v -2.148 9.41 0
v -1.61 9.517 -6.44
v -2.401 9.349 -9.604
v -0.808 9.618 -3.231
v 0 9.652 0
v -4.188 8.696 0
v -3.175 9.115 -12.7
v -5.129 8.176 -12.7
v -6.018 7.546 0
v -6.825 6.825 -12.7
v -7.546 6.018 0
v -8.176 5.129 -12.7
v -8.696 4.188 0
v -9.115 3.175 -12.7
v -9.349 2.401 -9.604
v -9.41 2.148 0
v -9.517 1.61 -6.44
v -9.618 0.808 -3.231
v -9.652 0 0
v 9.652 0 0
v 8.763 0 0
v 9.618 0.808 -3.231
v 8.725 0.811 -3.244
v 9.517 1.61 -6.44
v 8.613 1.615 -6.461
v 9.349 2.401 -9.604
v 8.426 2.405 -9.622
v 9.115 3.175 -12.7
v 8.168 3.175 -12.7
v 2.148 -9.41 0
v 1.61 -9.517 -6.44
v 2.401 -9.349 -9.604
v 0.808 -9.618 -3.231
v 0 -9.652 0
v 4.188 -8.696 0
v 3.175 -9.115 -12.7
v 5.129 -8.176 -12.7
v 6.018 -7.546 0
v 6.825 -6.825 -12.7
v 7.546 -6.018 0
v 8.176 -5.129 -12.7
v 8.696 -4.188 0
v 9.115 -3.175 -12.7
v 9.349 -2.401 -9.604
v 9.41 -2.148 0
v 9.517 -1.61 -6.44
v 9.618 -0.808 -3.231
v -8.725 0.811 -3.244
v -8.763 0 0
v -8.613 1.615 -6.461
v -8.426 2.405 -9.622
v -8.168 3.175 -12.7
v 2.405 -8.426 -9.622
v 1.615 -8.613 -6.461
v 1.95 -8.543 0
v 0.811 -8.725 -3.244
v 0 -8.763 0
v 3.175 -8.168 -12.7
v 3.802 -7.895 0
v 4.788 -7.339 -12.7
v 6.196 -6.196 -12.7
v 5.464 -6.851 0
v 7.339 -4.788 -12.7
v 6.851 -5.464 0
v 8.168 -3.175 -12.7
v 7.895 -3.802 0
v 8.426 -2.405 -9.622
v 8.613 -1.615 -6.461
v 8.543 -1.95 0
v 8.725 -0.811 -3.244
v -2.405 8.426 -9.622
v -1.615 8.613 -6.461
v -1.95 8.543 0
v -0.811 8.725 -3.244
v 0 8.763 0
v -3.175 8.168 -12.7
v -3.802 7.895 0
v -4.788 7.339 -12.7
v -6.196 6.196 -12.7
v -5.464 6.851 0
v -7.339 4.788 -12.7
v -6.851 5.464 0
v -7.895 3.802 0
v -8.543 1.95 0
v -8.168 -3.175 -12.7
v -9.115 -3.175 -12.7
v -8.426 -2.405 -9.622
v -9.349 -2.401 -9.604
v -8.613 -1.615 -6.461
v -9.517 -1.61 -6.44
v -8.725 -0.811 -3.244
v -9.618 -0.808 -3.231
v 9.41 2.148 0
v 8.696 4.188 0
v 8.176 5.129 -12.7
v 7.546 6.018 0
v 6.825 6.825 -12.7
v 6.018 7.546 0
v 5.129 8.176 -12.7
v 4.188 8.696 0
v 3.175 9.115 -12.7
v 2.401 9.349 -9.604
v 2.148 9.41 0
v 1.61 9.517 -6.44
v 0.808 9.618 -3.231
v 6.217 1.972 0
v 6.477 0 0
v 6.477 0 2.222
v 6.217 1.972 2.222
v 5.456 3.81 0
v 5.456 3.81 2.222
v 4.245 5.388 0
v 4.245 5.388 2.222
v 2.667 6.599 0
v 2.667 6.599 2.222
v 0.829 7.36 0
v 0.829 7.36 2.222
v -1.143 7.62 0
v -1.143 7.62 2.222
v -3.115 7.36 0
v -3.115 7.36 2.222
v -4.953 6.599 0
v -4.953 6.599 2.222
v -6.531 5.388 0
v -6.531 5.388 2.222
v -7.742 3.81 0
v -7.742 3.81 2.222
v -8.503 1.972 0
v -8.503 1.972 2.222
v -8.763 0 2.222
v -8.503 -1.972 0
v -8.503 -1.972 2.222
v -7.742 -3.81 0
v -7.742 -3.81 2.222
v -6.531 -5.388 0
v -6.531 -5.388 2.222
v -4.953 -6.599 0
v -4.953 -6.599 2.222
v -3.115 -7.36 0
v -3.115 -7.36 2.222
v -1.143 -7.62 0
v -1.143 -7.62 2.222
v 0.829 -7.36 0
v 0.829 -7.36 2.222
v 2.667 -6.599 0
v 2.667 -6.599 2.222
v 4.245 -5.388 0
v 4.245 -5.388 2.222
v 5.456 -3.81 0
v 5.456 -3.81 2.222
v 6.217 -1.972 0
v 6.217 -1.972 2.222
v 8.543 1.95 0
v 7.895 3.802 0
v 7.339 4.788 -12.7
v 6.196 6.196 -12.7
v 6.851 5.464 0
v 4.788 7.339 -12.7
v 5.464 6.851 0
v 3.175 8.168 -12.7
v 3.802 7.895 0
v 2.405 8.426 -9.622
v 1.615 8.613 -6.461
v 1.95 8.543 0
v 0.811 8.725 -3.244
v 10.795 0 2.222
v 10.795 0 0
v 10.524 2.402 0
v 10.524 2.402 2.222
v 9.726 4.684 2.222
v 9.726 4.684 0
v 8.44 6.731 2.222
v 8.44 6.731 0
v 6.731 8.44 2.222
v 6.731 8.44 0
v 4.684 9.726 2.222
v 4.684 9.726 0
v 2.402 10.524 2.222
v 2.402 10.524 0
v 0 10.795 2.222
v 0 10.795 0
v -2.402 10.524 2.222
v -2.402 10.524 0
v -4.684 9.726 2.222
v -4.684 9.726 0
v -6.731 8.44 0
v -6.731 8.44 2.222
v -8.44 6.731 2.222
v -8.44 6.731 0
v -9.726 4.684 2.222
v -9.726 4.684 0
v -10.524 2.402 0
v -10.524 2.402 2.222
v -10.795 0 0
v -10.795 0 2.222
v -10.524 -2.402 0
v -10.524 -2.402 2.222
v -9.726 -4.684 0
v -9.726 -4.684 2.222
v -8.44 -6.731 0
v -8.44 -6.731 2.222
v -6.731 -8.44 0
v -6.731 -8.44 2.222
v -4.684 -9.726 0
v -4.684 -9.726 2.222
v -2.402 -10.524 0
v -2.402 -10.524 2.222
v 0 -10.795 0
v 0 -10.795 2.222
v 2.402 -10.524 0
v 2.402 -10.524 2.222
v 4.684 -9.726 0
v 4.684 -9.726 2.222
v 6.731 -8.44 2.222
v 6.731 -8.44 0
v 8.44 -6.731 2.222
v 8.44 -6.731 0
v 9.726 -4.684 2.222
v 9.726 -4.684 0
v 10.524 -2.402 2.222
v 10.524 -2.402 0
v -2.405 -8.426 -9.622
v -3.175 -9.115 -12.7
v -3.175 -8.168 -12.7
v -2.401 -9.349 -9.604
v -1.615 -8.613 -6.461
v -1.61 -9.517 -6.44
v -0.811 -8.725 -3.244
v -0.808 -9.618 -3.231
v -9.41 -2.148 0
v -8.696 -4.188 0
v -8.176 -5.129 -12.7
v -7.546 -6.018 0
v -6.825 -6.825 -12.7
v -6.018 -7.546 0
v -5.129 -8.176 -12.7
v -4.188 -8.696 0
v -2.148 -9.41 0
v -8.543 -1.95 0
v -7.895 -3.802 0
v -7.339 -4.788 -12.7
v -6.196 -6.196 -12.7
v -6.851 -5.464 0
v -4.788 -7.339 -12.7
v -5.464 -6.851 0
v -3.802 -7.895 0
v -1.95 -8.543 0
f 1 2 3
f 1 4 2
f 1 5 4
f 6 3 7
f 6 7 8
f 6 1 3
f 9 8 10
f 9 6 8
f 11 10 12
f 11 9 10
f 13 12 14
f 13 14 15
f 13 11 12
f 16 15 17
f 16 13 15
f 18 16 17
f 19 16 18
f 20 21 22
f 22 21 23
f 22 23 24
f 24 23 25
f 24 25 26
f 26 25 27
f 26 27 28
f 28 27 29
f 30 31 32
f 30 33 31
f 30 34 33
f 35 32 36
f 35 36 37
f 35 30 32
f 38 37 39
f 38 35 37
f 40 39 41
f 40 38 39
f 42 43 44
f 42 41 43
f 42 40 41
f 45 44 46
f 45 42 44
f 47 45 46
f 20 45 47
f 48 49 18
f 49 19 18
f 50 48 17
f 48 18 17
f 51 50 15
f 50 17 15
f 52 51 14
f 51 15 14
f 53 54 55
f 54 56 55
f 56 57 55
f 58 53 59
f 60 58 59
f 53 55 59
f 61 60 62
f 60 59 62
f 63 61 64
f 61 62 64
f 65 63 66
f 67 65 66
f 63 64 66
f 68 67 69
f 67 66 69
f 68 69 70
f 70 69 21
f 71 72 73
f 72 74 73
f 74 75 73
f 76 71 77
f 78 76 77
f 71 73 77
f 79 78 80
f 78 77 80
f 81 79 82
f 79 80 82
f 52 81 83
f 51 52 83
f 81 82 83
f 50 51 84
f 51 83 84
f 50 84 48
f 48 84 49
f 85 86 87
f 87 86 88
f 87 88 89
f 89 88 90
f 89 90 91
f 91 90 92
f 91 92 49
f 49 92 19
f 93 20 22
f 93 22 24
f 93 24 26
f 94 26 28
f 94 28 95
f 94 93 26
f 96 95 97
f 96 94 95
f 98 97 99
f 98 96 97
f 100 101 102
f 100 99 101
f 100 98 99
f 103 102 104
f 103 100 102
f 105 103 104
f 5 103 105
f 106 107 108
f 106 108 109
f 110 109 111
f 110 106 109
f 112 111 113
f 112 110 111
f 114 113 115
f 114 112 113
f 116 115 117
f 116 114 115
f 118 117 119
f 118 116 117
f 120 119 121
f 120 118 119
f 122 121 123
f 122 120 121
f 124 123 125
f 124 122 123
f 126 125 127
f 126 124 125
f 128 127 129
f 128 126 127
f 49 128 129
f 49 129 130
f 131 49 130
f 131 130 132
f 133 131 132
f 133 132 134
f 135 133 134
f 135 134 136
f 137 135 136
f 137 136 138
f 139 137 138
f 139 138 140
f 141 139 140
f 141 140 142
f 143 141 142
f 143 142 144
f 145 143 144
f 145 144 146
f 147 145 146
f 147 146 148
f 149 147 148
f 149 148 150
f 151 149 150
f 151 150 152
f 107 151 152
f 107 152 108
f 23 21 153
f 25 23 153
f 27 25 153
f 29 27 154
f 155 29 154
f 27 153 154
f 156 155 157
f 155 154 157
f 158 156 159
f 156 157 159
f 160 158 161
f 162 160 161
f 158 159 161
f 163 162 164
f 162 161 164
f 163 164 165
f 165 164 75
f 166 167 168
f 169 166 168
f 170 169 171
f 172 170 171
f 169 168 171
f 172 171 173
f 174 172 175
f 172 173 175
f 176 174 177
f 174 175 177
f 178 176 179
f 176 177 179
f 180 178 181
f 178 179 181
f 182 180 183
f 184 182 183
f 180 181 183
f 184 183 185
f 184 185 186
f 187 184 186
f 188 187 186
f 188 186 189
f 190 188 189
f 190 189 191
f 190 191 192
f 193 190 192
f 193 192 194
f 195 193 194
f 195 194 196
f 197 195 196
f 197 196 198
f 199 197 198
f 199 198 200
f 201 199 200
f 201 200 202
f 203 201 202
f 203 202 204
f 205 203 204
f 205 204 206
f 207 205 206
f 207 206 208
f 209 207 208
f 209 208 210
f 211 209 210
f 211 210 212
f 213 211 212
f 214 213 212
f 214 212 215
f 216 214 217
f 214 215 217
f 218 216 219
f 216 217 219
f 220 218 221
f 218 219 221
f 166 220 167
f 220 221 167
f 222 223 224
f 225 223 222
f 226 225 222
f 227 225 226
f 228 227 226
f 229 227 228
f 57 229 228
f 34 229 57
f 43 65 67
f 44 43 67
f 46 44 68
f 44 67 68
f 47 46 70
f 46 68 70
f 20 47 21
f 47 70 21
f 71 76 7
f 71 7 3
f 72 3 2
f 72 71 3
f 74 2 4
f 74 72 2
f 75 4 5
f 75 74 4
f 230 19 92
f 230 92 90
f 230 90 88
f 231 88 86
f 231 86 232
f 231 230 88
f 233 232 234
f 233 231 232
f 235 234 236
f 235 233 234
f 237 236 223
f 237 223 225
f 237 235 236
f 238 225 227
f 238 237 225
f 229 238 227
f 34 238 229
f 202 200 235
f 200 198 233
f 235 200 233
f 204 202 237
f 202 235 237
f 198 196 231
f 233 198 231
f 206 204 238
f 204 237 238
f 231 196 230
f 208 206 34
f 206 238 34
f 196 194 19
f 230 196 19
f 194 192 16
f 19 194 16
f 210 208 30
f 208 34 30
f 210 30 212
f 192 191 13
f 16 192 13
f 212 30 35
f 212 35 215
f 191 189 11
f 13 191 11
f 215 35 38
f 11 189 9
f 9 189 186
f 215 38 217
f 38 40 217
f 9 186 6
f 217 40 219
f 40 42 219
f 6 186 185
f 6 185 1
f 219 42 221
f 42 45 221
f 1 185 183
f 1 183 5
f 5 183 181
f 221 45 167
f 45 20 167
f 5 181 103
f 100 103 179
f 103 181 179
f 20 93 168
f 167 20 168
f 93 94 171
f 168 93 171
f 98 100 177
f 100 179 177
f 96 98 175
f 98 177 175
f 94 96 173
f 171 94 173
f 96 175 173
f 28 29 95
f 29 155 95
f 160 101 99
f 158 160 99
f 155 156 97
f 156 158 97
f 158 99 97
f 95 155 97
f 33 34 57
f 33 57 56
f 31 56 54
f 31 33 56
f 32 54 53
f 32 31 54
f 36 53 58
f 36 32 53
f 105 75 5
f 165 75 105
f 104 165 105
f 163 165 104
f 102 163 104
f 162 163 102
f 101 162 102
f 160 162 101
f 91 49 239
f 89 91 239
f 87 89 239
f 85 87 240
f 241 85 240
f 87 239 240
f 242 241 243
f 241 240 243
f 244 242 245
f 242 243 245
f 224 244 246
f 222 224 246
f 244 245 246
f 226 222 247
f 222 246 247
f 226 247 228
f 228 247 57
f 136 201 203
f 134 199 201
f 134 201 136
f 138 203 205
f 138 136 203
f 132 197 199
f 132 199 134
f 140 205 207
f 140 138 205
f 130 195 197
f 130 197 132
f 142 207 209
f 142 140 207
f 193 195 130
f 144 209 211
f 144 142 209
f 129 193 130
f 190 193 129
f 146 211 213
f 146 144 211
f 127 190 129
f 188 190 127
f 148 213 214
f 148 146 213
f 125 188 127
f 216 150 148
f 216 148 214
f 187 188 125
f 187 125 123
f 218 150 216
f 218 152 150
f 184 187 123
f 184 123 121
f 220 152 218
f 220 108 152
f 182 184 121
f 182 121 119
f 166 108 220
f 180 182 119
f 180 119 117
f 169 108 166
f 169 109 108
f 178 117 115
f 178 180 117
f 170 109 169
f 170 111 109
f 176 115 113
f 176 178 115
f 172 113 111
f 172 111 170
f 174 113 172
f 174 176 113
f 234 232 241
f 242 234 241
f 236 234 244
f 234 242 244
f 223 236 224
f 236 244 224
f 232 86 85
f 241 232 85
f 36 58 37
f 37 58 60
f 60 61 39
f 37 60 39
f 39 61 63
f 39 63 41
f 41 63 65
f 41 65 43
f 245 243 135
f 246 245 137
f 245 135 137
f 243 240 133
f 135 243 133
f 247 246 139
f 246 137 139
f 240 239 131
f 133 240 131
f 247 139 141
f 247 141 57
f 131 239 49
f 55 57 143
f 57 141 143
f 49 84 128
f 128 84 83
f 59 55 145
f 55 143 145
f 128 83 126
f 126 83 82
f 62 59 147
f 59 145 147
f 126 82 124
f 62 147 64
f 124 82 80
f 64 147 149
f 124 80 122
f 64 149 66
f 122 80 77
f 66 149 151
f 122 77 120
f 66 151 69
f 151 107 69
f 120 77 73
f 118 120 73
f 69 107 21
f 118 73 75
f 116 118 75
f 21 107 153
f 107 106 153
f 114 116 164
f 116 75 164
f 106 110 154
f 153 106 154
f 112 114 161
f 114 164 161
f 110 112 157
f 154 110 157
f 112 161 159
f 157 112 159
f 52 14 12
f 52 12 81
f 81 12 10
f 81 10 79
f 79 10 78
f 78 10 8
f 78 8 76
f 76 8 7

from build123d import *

# Parameters (mm, degrees)
SKETCH2_R               = 10.795
SKETCH2_R_2             = 7.62
BOSS_EXTRUDE1_DEPTH     = 2.2225
SKETCH2_4_R             = 9.652
BOSS_EXTRUDE2_DEPTH     = 12.7
CUT_EXTRUDE1_DEPTH      = 12.7
CUT_EXTRUDE1_DEPTH_BACK = 12.7
CUT_EXTRUDE2_DEPTH      = 12.7
CUT_EXTRUDE2_DEPTH_BACK = 12.7


with BuildPart() as part:
    # Sketch2 → Boss-Extrude1 (new body)
    with BuildSketch(Plane.XY):
        Circle(SKETCH2_R)
        with Locations((-1.143, 0)):
            Circle(SKETCH2_R_2, mode=Mode.SUBTRACT)
    extrude(amount=BOSS_EXTRUDE1_DEPTH)

    # Sketch2<4> → Boss-Extrude2 (add)
    with BuildSketch(Plane.XY):
        Circle(SKETCH2_4_R)
        with BuildLine():
            ThreePointArc((8.763, 0), (7.7e-08, -8.763), (-8.763, -1.54e-07))
            ThreePointArc((-8.763, -1.54e-07), (-7.7e-08, 8.763), (8.763, 0))
        make_face(mode=Mode.SUBTRACT)
    extrude(amount=-BOSS_EXTRUDE2_DEPTH)

    # Sketch3 → Cut-Extrude1 (cut, two sides: drawn at the far end of the back side and taken through both)
    with BuildSketch(Plane(origin=(0, 0, 0), x_dir=(1, 0, 0), z_dir=(0, 1, 0)).offset(-CUT_EXTRUDE1_DEPTH_BACK)):
        Polygon((0, 0), (3.175, 12.7), (-3.175, 12.7), align=None)
    extrude(amount=CUT_EXTRUDE1_DEPTH + CUT_EXTRUDE1_DEPTH_BACK, mode=Mode.SUBTRACT)

    # Sketch5 → Cut-Extrude2 (cut, two sides: drawn at the far end of the back side and taken through both)
    with BuildSketch(Plane(origin=(0, 0, 0), x_dir=(0, 0, -1), z_dir=(1, 0, 0)).offset(-CUT_EXTRUDE2_DEPTH_BACK)):
        Polygon((0, 0), (12.7, 3.175), (12.7, -3.175), align=None)
    extrude(amount=CUT_EXTRUDE2_DEPTH + CUT_EXTRUDE2_DEPTH_BACK, mode=Mode.SUBTRACT)


solid = part.part
